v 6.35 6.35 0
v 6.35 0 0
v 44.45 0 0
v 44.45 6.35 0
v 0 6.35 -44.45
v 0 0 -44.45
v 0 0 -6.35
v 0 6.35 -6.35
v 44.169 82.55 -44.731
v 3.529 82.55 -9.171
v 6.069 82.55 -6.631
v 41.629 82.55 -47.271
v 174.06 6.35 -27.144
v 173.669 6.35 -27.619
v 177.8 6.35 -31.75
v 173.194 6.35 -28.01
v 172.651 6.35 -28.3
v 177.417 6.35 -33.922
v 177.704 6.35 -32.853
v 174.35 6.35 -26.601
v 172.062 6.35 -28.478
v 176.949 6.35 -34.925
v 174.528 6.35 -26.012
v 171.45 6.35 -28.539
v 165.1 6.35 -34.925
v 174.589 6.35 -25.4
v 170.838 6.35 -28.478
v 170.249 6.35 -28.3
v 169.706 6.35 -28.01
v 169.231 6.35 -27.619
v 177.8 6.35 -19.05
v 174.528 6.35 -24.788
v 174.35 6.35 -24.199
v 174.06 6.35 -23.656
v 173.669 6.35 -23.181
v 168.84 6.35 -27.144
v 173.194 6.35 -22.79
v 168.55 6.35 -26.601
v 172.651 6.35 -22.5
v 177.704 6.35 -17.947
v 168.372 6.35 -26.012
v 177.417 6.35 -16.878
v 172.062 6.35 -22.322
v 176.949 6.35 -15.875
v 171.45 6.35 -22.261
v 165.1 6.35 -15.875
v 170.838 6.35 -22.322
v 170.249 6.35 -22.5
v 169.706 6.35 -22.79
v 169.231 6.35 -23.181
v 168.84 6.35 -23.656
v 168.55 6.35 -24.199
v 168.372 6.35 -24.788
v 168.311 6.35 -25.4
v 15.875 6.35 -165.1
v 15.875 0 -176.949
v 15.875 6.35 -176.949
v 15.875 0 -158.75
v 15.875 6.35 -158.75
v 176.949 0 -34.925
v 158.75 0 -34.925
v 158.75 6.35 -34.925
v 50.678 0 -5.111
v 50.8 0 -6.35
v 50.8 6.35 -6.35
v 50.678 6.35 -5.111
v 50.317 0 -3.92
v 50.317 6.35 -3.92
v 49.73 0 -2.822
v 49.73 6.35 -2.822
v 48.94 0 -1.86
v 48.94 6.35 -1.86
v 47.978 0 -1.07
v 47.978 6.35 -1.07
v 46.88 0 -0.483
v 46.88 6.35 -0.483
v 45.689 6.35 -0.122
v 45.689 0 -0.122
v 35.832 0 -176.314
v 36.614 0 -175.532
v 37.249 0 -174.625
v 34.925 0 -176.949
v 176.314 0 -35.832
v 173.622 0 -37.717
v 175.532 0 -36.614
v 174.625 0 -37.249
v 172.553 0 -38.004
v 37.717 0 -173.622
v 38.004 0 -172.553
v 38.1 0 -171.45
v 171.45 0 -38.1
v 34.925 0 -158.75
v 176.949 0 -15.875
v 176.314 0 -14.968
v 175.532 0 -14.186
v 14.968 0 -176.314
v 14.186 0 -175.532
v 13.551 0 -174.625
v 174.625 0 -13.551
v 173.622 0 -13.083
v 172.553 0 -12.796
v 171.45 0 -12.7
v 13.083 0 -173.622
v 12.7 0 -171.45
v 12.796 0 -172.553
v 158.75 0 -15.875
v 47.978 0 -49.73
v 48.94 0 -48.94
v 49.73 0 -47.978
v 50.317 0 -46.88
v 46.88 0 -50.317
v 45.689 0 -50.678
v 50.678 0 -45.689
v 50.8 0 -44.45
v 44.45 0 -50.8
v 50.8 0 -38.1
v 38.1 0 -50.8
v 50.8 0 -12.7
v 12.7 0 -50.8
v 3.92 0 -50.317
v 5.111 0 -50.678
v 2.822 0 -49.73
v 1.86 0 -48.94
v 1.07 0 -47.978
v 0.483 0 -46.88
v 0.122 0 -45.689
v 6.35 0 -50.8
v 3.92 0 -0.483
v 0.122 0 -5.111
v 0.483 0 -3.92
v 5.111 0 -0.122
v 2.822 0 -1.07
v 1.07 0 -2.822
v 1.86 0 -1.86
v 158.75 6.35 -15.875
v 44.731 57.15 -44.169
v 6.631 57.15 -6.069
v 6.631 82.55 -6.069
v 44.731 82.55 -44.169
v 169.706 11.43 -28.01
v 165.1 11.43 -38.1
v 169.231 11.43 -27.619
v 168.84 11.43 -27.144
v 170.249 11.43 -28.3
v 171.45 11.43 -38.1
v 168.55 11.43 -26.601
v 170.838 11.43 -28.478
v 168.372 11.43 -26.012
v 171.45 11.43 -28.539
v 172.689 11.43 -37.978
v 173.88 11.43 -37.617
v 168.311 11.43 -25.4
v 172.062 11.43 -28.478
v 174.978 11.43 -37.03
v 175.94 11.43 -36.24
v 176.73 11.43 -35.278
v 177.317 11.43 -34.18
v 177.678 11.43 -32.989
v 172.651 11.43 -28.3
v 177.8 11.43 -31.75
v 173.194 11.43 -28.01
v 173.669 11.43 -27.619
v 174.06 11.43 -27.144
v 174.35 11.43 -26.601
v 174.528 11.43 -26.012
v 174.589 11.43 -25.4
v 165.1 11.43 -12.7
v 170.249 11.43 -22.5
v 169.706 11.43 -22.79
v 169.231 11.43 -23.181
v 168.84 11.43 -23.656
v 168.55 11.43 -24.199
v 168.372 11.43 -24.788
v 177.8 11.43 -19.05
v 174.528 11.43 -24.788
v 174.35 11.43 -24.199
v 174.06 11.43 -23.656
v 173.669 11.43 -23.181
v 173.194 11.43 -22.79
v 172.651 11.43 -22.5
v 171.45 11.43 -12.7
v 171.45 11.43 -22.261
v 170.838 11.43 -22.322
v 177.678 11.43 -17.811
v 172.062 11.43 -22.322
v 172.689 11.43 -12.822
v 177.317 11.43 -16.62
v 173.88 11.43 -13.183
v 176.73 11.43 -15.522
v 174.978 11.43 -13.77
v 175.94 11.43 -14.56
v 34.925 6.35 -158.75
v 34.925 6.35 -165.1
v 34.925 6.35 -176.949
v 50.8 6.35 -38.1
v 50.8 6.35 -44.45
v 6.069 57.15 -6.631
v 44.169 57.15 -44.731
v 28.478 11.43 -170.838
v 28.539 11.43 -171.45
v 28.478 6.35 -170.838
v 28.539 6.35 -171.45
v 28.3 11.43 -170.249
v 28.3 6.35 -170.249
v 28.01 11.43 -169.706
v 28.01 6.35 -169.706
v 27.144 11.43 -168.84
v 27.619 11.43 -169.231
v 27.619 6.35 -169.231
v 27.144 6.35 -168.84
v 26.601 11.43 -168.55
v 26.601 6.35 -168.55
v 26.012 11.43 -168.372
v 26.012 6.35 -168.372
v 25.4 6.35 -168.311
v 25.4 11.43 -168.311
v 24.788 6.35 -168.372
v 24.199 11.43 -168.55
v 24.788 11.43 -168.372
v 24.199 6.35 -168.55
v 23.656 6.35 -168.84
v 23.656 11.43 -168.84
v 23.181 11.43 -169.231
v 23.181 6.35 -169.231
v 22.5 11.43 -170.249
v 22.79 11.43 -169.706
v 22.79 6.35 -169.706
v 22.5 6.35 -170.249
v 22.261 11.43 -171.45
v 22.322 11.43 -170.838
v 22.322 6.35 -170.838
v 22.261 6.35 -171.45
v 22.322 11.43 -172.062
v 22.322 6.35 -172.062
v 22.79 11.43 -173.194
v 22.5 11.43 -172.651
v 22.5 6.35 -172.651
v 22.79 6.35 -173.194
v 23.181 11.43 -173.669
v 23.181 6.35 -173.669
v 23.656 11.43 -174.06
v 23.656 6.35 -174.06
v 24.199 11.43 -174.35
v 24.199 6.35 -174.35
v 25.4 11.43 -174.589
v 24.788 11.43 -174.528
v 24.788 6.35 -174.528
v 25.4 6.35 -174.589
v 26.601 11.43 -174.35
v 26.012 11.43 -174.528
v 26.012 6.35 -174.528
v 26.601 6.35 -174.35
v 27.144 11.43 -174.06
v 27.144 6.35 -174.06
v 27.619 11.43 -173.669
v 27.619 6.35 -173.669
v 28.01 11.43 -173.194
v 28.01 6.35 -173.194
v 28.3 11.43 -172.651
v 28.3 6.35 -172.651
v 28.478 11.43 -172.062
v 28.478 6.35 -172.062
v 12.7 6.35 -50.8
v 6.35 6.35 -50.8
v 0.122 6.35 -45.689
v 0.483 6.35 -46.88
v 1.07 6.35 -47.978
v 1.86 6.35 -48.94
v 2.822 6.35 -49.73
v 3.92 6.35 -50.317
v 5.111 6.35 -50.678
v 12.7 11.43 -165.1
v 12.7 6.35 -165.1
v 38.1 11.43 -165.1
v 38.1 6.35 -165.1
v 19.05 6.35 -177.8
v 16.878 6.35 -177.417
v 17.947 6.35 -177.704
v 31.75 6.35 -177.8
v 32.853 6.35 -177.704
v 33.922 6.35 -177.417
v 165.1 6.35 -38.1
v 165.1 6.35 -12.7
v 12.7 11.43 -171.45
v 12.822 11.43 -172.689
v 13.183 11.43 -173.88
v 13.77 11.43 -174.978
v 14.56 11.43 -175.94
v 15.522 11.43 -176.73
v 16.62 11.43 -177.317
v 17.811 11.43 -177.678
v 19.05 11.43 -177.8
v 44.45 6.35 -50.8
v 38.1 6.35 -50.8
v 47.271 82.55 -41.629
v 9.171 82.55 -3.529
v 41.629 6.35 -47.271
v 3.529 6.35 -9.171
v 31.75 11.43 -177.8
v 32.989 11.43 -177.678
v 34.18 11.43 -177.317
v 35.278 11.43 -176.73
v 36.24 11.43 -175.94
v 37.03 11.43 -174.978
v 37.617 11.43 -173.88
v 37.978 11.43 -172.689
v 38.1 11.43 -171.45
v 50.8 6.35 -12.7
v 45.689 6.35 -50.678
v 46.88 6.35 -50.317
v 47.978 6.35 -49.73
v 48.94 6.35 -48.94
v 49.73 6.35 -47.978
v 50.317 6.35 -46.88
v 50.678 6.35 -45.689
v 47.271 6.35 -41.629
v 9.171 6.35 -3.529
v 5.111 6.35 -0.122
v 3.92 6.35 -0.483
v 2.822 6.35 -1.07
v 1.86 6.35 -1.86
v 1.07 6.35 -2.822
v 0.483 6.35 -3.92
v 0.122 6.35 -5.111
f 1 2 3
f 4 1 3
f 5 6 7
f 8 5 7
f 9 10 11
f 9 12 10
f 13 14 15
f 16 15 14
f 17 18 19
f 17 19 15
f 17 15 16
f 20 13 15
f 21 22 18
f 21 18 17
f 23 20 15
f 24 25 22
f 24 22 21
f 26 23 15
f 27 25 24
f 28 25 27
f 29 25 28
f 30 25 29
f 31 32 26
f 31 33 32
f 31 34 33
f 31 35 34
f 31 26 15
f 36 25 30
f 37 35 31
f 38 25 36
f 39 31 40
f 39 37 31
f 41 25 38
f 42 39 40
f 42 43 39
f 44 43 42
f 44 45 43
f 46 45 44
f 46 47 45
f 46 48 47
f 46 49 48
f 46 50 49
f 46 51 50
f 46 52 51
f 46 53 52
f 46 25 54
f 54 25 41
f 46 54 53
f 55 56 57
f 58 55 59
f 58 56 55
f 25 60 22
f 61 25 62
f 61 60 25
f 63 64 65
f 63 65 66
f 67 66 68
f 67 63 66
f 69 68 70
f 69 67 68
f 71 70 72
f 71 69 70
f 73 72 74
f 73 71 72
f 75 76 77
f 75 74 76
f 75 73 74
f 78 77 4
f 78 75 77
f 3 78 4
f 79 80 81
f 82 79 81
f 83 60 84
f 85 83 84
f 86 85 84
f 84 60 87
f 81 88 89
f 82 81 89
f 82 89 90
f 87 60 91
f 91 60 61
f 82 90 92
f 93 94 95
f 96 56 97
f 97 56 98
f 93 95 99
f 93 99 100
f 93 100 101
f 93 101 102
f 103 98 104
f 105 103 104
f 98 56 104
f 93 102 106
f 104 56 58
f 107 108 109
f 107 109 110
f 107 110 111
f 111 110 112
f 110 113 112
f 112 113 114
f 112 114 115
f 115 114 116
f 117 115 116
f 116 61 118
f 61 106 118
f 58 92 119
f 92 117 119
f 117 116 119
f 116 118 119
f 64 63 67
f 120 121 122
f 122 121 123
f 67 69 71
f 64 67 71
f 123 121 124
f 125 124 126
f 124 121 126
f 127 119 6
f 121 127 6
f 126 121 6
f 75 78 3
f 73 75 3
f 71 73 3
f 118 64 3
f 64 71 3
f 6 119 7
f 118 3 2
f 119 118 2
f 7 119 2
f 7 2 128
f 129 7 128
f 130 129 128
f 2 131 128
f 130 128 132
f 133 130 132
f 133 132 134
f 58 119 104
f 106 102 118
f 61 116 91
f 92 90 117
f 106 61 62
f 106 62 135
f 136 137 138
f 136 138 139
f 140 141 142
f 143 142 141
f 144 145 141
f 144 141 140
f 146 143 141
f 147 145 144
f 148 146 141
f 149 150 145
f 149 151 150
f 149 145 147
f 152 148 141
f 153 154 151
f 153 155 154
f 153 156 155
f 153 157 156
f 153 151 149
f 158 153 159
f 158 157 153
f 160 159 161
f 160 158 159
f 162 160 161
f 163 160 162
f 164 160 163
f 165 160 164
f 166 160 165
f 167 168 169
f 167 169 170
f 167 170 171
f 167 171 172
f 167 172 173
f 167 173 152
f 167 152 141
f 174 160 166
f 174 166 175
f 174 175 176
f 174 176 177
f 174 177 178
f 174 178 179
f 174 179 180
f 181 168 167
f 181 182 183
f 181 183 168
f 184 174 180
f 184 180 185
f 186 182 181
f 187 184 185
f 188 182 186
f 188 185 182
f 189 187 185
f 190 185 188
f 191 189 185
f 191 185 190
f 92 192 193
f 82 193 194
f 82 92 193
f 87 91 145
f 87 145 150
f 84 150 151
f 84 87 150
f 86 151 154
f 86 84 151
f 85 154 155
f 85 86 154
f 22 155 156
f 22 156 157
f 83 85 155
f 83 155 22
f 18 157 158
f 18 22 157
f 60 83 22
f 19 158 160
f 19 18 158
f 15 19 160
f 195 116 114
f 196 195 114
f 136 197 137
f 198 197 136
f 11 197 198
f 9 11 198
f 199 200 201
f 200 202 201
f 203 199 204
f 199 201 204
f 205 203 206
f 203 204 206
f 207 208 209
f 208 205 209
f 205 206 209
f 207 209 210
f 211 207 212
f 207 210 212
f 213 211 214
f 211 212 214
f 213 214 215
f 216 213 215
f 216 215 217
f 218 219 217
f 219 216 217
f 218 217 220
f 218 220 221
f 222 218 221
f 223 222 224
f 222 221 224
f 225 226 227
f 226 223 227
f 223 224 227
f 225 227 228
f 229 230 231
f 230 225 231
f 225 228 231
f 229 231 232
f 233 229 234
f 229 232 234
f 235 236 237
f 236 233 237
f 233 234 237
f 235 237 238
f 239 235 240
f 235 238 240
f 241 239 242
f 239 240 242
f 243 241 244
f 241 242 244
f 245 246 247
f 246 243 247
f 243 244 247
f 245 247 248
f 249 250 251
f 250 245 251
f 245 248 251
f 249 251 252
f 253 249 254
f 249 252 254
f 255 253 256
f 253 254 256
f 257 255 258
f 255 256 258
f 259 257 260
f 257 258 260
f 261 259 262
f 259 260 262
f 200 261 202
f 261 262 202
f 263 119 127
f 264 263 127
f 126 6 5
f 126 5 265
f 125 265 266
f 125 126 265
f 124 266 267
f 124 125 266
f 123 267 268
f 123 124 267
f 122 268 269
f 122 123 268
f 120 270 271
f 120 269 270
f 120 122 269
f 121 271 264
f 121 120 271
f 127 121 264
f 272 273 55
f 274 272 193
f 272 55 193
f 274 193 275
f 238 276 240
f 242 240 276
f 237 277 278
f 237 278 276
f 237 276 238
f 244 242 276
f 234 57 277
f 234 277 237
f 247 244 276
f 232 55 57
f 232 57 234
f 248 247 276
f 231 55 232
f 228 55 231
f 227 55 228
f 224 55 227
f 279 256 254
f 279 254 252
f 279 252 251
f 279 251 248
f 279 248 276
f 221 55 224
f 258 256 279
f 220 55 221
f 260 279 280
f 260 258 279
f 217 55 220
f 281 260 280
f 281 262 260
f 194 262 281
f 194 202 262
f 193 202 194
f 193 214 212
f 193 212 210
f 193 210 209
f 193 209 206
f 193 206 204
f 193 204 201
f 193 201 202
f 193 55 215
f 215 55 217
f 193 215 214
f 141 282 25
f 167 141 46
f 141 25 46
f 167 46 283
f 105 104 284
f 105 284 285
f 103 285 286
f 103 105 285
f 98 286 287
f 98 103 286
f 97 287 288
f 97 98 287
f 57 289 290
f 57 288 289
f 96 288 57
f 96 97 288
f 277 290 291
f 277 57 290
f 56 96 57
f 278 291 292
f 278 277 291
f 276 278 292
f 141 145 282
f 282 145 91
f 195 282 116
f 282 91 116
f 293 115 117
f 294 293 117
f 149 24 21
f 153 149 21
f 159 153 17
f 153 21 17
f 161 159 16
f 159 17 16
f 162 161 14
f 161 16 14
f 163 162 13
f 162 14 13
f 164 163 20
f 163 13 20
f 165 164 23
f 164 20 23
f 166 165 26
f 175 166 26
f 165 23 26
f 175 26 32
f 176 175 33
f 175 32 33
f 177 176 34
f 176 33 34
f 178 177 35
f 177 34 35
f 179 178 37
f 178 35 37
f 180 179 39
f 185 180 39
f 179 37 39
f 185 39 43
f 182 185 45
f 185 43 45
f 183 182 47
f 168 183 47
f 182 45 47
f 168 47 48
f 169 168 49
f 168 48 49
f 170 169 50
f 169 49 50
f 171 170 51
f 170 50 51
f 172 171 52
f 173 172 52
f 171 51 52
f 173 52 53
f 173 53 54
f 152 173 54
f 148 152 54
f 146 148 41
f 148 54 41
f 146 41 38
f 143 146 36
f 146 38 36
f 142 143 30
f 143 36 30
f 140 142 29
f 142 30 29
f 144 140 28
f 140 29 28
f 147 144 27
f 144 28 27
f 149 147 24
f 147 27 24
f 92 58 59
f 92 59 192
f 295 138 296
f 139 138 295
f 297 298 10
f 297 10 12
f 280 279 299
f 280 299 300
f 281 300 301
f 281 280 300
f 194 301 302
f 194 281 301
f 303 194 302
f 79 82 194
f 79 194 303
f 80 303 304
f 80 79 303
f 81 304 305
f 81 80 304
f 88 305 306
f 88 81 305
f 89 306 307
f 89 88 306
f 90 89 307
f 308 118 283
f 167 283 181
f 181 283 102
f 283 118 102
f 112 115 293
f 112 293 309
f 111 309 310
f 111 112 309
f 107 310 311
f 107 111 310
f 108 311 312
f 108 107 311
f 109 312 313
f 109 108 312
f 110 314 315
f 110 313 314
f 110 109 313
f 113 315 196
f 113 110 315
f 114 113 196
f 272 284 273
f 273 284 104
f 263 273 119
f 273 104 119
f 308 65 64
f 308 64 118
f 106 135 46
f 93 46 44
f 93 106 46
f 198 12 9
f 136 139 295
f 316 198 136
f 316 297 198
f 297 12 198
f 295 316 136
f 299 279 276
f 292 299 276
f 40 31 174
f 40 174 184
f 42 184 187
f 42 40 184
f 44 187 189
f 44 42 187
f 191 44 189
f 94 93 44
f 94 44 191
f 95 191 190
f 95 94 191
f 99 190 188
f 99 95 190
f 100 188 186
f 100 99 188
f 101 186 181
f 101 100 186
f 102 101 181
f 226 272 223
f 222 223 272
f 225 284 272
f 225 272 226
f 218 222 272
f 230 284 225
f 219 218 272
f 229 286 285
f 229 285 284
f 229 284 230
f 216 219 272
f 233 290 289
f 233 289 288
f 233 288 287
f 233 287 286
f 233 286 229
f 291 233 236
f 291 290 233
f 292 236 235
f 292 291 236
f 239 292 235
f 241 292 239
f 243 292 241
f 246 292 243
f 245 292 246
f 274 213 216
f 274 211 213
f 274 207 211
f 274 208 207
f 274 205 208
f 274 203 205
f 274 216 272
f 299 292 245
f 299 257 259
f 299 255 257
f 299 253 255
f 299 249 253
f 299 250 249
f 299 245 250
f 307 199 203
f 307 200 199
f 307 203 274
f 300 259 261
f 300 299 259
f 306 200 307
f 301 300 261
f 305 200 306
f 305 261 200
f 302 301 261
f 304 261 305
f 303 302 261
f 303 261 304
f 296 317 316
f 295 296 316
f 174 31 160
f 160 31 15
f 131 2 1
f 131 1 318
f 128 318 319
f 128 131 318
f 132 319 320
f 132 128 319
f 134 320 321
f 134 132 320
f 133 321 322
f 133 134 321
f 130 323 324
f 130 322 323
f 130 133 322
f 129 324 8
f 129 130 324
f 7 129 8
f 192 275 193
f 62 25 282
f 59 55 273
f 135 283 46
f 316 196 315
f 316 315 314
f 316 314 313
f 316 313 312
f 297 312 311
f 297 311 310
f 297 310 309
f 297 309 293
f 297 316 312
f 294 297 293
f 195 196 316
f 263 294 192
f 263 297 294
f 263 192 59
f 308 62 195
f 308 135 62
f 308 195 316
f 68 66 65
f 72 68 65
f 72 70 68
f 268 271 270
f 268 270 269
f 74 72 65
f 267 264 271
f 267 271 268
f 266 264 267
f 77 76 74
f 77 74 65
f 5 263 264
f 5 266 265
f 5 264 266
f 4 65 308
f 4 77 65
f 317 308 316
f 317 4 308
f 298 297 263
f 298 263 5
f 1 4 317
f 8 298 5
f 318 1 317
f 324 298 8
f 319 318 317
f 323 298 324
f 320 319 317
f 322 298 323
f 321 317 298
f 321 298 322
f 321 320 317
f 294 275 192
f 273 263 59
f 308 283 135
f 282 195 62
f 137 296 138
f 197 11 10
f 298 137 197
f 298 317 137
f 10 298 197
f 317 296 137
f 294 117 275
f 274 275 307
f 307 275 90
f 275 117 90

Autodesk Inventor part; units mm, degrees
ref_plane "YZ Plane" through (0, 0, 0) normal (1, 0, 0) x (0, 1, 0)
ref_plane "XZ Plane" through (0, 0, 0) normal (0, 1, 0) x (-1, 0, 0)
sketch "Sketch1" plane through (0, 0, 0) normal (0, 1, 0) x (-1, 0, 0)
  line L0 (-6.35, 0) -> (-44.45, 0)
  line L1 (0, -44.45) -> (0, -6.35)
  line L2 (-38.1, -50.8) -> (-38.1, -171.45)
  line L3 (-31.75, -177.8) -> (-19.05, -177.8)
  line L4 (-12.7, -171.45) -> (-12.7, -50.8)
  line L5 (-25.4, 0) -> (-25.4, -50.8) construction
  line L6 (-44.45, -50.8) -> (-25.4, -50.8)
  line L7 (-12.7, -50.8) -> (-6.35, -50.8)
  line L8 (0, 0) -> (-50.8, -50.8) construction
  line L9 (-50.8, -38.1) -> (-171.45, -38.1)
  line L10 (-177.8, -31.75) -> (-177.8, -19.05)
  line L11 (-171.45, -12.7) -> (-50.8, -12.7)
  line L12 (-50.8, -6.35) -> (-50.8, -12.7)
  line L13 (-50.8, -38.1) -> (-50.8, -44.45)
  arc A0 (-50.8, -44.45) -> (-44.45, -50.8) centre (-44.45, -44.45) ccw
  arc A1 (-6.35, -50.8) -> (0, -44.45) centre (-6.35, -44.45) ccw
  arc A2 (0, -6.35) -> (-6.35, 0) centre (-6.35, -6.35) ccw
  arc A3 (-44.45, 0) -> (-50.8, -6.35) centre (-44.45, -6.35) ccw
  arc A4 (-19.05, -177.8) -> (-12.7, -171.45) centre (-19.05, -171.45) ccw
  arc A5 (-38.1, -171.45) -> (-31.75, -177.8) centre (-31.75, -171.45) ccw
  arc A6 (-171.45, -12.7) -> (-177.8, -19.05) centre (-171.45, -19.05) ccw
  arc A7 (-177.8, -31.75) -> (-171.45, -38.1) centre (-171.45, -31.75) ccw
  point P0 (-50.8, 0)
  point P1 (0, -50.8)
  point P2 (-38.1, -177.8)
  point P3 (-12.7, -177.8)
  point P4 (-177.8, -38.1)
  point P5 (-177.8, -12.7)
  dimension "d0" = 50.8
  dimension "d1" = 50.8
  dimension "d2" = 25.4
  dimension "d3" = 127
  dimension "d4" = 6.35
  dimension "d5" = 6.35
  dimension "d6" = 6.35
extrude "Extrusion2" add sketch "Sketch1" along normal blind 6.35
sketch "Sketch2" plane through (0, 6.35, 0) normal (0, 1, 0) x (1, 0, 0)
  arc A0 (50.8, 44.45) -> (44.45, 50.8) centre (44.45, 44.45) ccw construction
  arc A1 (0, 6.35) -> (6.35, 0) centre (6.35, 6.35) ccw construction
  line L0 (44.45, 44.45) -> (6.35, 6.35) construction
  line L1 (6.6306, 6.0694) -> (44.7306, 44.1694)
  line L2 (6.6306, 6.0694) -> (9.1706, 3.5294)
  line L3 (9.1706, 3.5294) -> (47.2706, 41.6294)
  line L4 (44.7306, 44.1694) -> (47.2706, 41.6294)
  line L5 (6.0694, 6.6306) -> (44.1694, 44.7306)
  line L6 (6.0694, 6.6306) -> (3.5294, 9.1706)
  line L7 (3.5294, 9.1706) -> (41.6294, 47.2706)
  line L8 (44.1694, 44.7306) -> (41.6294, 47.2706)
  point P0 (0, 0)
  dimension "d14" = 38.1
  dimension "d15" = 0.3969
  dimension "d16" = 0.2806
  dimension "d17" = 90
  dimension "d18" = 2.54
extrude "Extrusion3" add sketch "Sketch2" along normal blind 76.2
sketch "Sketch3" plane through (0, 6.35, 0) normal (0, 1, 0) x (1, 0, 0)
  line L0 (6.0694, 6.6306) -> (44.1694, 44.7306) projected
  line L1 (47.2706, 41.6294) -> (44.7306, 44.1694) projected
  line L2 (44.1694, 44.7306) -> (44.7306, 44.1694)
  line L3 (44.7306, 44.1694) -> (6.6306, 6.0694) projected
  line L4 (44.7306, 44.1694) -> (6.6306, 6.0694)
  line L5 (6.0694, 6.6306) -> (3.5294, 9.1706) projected
  line L6 (6.6306, 6.0694) -> (6.0694, 6.6306)
  line L7 (6.0694, 6.6306) -> (44.1694, 44.7306)
  point P0 (0, 0)
extrude "Extrusion4" add sketch "Sketch3" along normal blind 50.8
sketch "Sketch4" plane through (0, 6.35, 0) normal (0, 1, 0) x (1, 0, 0)
  arc A0 (19.05, 177.8) -> (12.7, 171.45) centre (19.05, 171.45) ccw construction
  arc A1 (38.1, 171.45) -> (31.75, 177.8) centre (31.75, 171.45) ccw construction
  line L0 (19.05, 171.45) -> (31.75, 171.45) construction
  circle A2 centre (25.4, 171.45) radius 3.1386
  line L1 (12.7, 171.45) -> (12.7, 50.8) projected
  line L2 (12.7, 165.1) -> (38.1, 165.1)
  line L3 (38.1, 165.1) -> (38.1, 171.45)
  line L4 (12.7, 165.1) -> (12.7, 171.45)
  line L5 (31.75, 177.8) -> (19.05, 177.8) projected
  line L6 (19.05, 177.8) -> (31.75, 177.8)
  arc A3 (19.05, 177.8) -> (12.7, 171.45) centre (19.05, 171.45) ccw
  arc A4 (38.1, 171.45) -> (31.75, 177.8) centre (31.75, 171.45) ccw
  point P0 (0, 0)
  point P1 (14.5599, 175.9401)
  dimension "d23" = 6.2773
  dimension "d68" = 6.35
ref_plane "Work Plane1" through (48.9401, 6.35, -48.9401) normal (-0.7071, 0, -0.7071) x (0, -1, 0)
extrude "Extrusion6" add sketch "Sketch4" along normal blind 5.08
sketch "Sketch11" plane through (0, 0, 0) normal (0, -1, 0) x (1, 0, 0)
  line L0 (34.925, -177.8) -> (15.875, -177.8) construction
  line L1 (25.4, -177.8) -> (25.4, -169.6336) construction
  line L2 (34.925, -177.8) -> (15.875, -177.8)
  line L3 (15.875, -177.8) -> (15.875, -158.75)
  line L4 (15.875, -158.75) -> (34.925, -158.75)
  line L5 (34.925, -158.75) -> (34.925, -177.8)
  line L6 (31.75, -177.8) -> (19.05, -177.8) projected
  point P0 (0, 0)
  dimension "d71" = 19.05
  dimension "d74" = 19.05
extrude "Extrusion7" cut sketch "Sketch11" against normal blind 6.35
mirror "Mirror2" about plane through (48.9401, 6.35, -48.9401) normal (-0.7071, 0, -0.7071) of "Extrusion6", "Extrusion7"
equation "\"d37\" = 55deg"
equation "\"Sketch5_Pitch\" = 1.27"
equation "\"d56\" = 55deg"
equation "\"Sketch8_Pitch\" = 1.27"
properties part number "beamsplitter main"
